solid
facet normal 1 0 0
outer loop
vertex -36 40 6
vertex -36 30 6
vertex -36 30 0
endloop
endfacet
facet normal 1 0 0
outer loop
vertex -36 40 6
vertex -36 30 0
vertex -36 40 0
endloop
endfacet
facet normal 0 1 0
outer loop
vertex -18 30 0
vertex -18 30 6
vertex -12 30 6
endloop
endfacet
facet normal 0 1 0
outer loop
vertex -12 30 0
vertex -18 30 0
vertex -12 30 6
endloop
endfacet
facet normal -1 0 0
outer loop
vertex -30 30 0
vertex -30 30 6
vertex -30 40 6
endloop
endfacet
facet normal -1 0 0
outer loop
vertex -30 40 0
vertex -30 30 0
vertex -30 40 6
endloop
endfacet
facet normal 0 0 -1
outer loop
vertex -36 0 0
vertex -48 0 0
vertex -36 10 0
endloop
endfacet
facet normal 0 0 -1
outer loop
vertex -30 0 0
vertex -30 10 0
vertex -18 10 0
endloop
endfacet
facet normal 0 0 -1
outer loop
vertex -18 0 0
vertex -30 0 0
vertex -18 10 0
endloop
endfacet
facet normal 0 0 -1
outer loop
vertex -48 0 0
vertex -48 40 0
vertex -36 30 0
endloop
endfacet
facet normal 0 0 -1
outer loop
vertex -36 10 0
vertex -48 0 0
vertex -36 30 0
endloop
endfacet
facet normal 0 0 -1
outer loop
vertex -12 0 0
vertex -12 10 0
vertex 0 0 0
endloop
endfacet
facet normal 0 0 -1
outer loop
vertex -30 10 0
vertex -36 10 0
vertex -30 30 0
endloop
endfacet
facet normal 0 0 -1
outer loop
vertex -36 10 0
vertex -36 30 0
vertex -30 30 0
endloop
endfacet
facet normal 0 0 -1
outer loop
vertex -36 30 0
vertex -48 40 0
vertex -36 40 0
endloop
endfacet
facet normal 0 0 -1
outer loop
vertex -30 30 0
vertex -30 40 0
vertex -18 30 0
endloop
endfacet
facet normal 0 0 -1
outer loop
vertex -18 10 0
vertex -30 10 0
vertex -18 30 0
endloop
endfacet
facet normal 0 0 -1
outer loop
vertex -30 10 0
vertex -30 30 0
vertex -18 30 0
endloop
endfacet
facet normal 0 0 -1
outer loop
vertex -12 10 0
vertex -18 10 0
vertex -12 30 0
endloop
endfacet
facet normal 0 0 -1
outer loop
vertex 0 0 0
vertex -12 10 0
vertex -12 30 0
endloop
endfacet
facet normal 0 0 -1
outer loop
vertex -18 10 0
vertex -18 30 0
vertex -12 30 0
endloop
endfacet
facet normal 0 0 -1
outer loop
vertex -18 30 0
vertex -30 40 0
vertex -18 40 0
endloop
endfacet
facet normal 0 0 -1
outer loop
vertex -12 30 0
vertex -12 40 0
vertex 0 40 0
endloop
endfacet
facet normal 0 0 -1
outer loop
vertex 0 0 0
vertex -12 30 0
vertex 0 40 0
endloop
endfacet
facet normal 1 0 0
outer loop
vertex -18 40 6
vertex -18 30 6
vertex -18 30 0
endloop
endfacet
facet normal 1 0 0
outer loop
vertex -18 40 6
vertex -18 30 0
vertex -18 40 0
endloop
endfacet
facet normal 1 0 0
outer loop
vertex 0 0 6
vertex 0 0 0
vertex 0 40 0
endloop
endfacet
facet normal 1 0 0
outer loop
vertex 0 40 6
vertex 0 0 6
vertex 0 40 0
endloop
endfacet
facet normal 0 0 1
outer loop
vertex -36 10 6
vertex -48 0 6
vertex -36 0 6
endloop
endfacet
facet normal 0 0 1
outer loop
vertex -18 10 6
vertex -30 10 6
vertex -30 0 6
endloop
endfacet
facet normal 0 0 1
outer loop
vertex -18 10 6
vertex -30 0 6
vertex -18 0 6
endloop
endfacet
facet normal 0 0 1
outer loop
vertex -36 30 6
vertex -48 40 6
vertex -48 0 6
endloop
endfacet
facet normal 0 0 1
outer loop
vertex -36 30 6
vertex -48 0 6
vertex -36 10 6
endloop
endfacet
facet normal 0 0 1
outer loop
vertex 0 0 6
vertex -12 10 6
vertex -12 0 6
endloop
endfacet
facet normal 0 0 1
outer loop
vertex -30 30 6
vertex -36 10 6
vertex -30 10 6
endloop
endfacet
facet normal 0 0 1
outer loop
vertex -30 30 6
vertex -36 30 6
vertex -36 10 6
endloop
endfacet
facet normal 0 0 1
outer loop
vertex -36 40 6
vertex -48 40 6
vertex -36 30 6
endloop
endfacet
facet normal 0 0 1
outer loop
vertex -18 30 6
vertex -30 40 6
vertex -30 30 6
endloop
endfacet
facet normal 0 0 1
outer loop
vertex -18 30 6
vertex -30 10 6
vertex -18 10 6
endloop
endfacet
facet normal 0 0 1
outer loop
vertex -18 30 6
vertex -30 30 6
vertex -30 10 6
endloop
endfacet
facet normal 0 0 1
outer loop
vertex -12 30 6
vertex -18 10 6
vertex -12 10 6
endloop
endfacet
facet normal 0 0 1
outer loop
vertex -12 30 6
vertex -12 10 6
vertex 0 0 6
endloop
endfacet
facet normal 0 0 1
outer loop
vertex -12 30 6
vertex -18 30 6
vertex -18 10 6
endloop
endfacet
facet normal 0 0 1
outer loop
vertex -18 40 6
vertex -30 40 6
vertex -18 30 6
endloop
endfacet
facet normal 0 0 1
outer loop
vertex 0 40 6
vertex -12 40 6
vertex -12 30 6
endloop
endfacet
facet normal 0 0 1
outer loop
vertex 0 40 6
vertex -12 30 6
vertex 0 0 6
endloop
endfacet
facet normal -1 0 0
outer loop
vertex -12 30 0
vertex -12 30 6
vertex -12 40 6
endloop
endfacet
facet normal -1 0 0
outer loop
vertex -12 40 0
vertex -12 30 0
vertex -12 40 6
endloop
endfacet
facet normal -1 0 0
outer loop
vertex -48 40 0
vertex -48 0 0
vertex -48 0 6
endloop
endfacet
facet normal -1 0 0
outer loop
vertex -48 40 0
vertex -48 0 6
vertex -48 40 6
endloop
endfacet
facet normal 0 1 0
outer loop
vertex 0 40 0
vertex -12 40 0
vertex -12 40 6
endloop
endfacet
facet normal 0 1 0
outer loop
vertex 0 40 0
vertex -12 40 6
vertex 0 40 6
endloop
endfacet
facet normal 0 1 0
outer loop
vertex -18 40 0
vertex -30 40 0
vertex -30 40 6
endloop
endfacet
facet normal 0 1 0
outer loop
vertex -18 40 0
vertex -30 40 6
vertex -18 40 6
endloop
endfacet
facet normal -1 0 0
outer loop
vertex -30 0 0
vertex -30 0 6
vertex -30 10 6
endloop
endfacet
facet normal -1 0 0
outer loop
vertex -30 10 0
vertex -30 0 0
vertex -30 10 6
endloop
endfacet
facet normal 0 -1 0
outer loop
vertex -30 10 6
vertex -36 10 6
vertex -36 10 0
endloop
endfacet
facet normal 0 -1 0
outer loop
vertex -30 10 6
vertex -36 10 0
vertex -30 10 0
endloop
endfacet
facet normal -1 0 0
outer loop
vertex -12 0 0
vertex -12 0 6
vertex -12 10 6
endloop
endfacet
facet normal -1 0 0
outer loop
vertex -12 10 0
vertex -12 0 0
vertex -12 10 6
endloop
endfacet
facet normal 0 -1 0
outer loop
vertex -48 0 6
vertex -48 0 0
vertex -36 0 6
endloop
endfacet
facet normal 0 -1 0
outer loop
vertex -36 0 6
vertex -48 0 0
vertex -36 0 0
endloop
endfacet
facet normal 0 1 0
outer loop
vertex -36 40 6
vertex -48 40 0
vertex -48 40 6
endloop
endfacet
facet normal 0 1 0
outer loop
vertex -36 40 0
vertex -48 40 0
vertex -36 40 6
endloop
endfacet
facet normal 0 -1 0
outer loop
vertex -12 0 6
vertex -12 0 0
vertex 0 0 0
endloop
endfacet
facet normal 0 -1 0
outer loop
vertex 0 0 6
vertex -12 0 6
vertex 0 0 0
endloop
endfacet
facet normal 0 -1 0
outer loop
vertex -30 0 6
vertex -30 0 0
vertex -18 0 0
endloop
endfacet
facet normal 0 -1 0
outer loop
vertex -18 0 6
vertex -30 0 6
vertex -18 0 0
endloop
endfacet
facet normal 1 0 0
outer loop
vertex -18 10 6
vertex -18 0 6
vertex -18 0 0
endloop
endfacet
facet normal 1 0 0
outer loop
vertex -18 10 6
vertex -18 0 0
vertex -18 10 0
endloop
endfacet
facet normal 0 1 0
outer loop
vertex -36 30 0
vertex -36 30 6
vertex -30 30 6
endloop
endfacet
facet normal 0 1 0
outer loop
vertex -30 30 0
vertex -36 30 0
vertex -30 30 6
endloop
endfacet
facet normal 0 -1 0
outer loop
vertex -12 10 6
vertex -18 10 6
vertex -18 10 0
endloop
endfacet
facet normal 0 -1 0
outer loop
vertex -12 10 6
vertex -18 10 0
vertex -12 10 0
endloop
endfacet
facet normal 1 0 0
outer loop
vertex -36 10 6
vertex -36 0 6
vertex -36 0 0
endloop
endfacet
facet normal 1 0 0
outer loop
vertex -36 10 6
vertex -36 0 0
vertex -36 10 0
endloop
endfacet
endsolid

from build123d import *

# Parameters (mm, degrees)
SKETCH1_W            = 48
SKETCH1_H            = 40
BOSS_EXTRUDE1_DEPTH  = 6
SKETCH2_W            = 6
SKETCH2_H            = 10
CUT_EXTRUDE1_DEPTH   = 63.769419306
LPATTERN1_COUNT      = 2
LPATTERN1_PITCH      = 18
LPATTERN1_COUNT_DIR2 = 2
LPATTERN1_PITCH_DIR2 = 30


with BuildPart() as part:
    # Sketch1 → Boss-Extrude1 (new body)
    with BuildSketch(Plane.XY):
        with Locations((-24, 20)):
            Rectangle(SKETCH1_W, SKETCH1_H)
    extrude(amount=BOSS_EXTRUDE1_DEPTH)

    # Sketch2 → Cut-Extrude1 (cut, through all)
    with BuildSketch(Plane.XY.offset(6)):
        with Locations((-33, 35)):
            Rectangle(SKETCH2_W, SKETCH2_H)
    cut_extrude1 = extrude(amount=-CUT_EXTRUDE1_DEPTH, mode=Mode.SUBTRACT)

    # LPattern1: Cut-Extrude1 2 × 2
    with Locations(*[(i * LPATTERN1_PITCH, -j * LPATTERN1_PITCH_DIR2, 0) for i in range(LPATTERN1_COUNT) for j in range(LPATTERN1_COUNT_DIR2) if (i, j) != (0, 0)]):
        add(cut_extrude1, mode=Mode.SUBTRACT)


solid = part.part
